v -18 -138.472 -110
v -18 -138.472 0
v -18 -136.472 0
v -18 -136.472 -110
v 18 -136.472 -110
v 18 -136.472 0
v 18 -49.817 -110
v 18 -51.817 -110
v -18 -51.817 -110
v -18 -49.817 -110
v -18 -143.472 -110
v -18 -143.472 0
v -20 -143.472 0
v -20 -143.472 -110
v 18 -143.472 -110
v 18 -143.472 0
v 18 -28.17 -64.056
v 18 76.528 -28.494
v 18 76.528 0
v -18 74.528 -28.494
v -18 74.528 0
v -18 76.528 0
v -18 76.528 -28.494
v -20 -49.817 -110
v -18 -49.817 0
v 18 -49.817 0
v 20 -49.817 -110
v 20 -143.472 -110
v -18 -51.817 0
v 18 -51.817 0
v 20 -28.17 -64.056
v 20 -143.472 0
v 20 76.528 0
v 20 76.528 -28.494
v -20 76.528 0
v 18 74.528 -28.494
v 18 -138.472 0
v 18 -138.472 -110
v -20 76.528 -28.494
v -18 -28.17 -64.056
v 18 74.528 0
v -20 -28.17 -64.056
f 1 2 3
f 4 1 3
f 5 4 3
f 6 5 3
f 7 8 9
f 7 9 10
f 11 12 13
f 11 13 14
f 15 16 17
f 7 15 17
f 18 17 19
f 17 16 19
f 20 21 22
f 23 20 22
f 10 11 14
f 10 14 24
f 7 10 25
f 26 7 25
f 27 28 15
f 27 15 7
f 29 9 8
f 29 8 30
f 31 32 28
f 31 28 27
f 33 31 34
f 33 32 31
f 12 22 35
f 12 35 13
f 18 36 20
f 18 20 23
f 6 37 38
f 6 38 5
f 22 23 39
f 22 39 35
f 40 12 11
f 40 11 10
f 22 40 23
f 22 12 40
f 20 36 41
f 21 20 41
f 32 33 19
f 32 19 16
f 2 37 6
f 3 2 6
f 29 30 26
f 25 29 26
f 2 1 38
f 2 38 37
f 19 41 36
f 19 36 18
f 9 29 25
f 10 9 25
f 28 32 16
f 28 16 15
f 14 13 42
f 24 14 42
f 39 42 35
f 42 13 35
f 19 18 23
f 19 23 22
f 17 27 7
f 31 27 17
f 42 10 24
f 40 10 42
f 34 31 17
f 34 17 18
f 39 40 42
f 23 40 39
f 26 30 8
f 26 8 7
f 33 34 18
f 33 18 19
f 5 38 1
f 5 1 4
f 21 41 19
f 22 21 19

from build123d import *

# Parameters (mm, degrees)
F1_DEPTH = 20
F2_W     = 36
F2_H     = 220
F3_DEPTH = 157
F4_W     = 2
F4_H     = 110
F4_H_2   = 28.493976
F5_DEPTH = 36


with BuildPart() as f1:
    # F0 (on Right) → F1 (new body, symmetric)
    with BuildSketch(Plane.YZ):
        Polygon((76.528295, 0), (-143.471705, 0), (-143.471705, -110), (-49.817088, -110), (-28.170498, -64.056224), (76.528295, -28.493976), align=None)
    extrude(amount=F1_DEPTH, both=True)

    # F2 (on face) → F3 (cut)
    with BuildSketch(Plane.XY):
        with Locations((0, -33.471705)):
            Rectangle(F2_W, F2_H)
    extrude(amount=-F3_DEPTH, mode=Mode.SUBTRACT)


with BuildPart() as f5:
    # F4 (on face) → F5 (new body, through all)
    with BuildSketch(Plane.YZ.offset(-18)):
        with Locations((-137.471705, -55)):
            Rectangle(F4_W, F4_H)
        with Locations((-50.817088, -55)):
            Rectangle(F4_W, F4_H)
        with Locations((75.528295, -14.246988)):
            Rectangle(F4_W, F4_H_2)
    extrude(amount=F5_DEPTH)


solid = Compound([f1.part, f5.part])
